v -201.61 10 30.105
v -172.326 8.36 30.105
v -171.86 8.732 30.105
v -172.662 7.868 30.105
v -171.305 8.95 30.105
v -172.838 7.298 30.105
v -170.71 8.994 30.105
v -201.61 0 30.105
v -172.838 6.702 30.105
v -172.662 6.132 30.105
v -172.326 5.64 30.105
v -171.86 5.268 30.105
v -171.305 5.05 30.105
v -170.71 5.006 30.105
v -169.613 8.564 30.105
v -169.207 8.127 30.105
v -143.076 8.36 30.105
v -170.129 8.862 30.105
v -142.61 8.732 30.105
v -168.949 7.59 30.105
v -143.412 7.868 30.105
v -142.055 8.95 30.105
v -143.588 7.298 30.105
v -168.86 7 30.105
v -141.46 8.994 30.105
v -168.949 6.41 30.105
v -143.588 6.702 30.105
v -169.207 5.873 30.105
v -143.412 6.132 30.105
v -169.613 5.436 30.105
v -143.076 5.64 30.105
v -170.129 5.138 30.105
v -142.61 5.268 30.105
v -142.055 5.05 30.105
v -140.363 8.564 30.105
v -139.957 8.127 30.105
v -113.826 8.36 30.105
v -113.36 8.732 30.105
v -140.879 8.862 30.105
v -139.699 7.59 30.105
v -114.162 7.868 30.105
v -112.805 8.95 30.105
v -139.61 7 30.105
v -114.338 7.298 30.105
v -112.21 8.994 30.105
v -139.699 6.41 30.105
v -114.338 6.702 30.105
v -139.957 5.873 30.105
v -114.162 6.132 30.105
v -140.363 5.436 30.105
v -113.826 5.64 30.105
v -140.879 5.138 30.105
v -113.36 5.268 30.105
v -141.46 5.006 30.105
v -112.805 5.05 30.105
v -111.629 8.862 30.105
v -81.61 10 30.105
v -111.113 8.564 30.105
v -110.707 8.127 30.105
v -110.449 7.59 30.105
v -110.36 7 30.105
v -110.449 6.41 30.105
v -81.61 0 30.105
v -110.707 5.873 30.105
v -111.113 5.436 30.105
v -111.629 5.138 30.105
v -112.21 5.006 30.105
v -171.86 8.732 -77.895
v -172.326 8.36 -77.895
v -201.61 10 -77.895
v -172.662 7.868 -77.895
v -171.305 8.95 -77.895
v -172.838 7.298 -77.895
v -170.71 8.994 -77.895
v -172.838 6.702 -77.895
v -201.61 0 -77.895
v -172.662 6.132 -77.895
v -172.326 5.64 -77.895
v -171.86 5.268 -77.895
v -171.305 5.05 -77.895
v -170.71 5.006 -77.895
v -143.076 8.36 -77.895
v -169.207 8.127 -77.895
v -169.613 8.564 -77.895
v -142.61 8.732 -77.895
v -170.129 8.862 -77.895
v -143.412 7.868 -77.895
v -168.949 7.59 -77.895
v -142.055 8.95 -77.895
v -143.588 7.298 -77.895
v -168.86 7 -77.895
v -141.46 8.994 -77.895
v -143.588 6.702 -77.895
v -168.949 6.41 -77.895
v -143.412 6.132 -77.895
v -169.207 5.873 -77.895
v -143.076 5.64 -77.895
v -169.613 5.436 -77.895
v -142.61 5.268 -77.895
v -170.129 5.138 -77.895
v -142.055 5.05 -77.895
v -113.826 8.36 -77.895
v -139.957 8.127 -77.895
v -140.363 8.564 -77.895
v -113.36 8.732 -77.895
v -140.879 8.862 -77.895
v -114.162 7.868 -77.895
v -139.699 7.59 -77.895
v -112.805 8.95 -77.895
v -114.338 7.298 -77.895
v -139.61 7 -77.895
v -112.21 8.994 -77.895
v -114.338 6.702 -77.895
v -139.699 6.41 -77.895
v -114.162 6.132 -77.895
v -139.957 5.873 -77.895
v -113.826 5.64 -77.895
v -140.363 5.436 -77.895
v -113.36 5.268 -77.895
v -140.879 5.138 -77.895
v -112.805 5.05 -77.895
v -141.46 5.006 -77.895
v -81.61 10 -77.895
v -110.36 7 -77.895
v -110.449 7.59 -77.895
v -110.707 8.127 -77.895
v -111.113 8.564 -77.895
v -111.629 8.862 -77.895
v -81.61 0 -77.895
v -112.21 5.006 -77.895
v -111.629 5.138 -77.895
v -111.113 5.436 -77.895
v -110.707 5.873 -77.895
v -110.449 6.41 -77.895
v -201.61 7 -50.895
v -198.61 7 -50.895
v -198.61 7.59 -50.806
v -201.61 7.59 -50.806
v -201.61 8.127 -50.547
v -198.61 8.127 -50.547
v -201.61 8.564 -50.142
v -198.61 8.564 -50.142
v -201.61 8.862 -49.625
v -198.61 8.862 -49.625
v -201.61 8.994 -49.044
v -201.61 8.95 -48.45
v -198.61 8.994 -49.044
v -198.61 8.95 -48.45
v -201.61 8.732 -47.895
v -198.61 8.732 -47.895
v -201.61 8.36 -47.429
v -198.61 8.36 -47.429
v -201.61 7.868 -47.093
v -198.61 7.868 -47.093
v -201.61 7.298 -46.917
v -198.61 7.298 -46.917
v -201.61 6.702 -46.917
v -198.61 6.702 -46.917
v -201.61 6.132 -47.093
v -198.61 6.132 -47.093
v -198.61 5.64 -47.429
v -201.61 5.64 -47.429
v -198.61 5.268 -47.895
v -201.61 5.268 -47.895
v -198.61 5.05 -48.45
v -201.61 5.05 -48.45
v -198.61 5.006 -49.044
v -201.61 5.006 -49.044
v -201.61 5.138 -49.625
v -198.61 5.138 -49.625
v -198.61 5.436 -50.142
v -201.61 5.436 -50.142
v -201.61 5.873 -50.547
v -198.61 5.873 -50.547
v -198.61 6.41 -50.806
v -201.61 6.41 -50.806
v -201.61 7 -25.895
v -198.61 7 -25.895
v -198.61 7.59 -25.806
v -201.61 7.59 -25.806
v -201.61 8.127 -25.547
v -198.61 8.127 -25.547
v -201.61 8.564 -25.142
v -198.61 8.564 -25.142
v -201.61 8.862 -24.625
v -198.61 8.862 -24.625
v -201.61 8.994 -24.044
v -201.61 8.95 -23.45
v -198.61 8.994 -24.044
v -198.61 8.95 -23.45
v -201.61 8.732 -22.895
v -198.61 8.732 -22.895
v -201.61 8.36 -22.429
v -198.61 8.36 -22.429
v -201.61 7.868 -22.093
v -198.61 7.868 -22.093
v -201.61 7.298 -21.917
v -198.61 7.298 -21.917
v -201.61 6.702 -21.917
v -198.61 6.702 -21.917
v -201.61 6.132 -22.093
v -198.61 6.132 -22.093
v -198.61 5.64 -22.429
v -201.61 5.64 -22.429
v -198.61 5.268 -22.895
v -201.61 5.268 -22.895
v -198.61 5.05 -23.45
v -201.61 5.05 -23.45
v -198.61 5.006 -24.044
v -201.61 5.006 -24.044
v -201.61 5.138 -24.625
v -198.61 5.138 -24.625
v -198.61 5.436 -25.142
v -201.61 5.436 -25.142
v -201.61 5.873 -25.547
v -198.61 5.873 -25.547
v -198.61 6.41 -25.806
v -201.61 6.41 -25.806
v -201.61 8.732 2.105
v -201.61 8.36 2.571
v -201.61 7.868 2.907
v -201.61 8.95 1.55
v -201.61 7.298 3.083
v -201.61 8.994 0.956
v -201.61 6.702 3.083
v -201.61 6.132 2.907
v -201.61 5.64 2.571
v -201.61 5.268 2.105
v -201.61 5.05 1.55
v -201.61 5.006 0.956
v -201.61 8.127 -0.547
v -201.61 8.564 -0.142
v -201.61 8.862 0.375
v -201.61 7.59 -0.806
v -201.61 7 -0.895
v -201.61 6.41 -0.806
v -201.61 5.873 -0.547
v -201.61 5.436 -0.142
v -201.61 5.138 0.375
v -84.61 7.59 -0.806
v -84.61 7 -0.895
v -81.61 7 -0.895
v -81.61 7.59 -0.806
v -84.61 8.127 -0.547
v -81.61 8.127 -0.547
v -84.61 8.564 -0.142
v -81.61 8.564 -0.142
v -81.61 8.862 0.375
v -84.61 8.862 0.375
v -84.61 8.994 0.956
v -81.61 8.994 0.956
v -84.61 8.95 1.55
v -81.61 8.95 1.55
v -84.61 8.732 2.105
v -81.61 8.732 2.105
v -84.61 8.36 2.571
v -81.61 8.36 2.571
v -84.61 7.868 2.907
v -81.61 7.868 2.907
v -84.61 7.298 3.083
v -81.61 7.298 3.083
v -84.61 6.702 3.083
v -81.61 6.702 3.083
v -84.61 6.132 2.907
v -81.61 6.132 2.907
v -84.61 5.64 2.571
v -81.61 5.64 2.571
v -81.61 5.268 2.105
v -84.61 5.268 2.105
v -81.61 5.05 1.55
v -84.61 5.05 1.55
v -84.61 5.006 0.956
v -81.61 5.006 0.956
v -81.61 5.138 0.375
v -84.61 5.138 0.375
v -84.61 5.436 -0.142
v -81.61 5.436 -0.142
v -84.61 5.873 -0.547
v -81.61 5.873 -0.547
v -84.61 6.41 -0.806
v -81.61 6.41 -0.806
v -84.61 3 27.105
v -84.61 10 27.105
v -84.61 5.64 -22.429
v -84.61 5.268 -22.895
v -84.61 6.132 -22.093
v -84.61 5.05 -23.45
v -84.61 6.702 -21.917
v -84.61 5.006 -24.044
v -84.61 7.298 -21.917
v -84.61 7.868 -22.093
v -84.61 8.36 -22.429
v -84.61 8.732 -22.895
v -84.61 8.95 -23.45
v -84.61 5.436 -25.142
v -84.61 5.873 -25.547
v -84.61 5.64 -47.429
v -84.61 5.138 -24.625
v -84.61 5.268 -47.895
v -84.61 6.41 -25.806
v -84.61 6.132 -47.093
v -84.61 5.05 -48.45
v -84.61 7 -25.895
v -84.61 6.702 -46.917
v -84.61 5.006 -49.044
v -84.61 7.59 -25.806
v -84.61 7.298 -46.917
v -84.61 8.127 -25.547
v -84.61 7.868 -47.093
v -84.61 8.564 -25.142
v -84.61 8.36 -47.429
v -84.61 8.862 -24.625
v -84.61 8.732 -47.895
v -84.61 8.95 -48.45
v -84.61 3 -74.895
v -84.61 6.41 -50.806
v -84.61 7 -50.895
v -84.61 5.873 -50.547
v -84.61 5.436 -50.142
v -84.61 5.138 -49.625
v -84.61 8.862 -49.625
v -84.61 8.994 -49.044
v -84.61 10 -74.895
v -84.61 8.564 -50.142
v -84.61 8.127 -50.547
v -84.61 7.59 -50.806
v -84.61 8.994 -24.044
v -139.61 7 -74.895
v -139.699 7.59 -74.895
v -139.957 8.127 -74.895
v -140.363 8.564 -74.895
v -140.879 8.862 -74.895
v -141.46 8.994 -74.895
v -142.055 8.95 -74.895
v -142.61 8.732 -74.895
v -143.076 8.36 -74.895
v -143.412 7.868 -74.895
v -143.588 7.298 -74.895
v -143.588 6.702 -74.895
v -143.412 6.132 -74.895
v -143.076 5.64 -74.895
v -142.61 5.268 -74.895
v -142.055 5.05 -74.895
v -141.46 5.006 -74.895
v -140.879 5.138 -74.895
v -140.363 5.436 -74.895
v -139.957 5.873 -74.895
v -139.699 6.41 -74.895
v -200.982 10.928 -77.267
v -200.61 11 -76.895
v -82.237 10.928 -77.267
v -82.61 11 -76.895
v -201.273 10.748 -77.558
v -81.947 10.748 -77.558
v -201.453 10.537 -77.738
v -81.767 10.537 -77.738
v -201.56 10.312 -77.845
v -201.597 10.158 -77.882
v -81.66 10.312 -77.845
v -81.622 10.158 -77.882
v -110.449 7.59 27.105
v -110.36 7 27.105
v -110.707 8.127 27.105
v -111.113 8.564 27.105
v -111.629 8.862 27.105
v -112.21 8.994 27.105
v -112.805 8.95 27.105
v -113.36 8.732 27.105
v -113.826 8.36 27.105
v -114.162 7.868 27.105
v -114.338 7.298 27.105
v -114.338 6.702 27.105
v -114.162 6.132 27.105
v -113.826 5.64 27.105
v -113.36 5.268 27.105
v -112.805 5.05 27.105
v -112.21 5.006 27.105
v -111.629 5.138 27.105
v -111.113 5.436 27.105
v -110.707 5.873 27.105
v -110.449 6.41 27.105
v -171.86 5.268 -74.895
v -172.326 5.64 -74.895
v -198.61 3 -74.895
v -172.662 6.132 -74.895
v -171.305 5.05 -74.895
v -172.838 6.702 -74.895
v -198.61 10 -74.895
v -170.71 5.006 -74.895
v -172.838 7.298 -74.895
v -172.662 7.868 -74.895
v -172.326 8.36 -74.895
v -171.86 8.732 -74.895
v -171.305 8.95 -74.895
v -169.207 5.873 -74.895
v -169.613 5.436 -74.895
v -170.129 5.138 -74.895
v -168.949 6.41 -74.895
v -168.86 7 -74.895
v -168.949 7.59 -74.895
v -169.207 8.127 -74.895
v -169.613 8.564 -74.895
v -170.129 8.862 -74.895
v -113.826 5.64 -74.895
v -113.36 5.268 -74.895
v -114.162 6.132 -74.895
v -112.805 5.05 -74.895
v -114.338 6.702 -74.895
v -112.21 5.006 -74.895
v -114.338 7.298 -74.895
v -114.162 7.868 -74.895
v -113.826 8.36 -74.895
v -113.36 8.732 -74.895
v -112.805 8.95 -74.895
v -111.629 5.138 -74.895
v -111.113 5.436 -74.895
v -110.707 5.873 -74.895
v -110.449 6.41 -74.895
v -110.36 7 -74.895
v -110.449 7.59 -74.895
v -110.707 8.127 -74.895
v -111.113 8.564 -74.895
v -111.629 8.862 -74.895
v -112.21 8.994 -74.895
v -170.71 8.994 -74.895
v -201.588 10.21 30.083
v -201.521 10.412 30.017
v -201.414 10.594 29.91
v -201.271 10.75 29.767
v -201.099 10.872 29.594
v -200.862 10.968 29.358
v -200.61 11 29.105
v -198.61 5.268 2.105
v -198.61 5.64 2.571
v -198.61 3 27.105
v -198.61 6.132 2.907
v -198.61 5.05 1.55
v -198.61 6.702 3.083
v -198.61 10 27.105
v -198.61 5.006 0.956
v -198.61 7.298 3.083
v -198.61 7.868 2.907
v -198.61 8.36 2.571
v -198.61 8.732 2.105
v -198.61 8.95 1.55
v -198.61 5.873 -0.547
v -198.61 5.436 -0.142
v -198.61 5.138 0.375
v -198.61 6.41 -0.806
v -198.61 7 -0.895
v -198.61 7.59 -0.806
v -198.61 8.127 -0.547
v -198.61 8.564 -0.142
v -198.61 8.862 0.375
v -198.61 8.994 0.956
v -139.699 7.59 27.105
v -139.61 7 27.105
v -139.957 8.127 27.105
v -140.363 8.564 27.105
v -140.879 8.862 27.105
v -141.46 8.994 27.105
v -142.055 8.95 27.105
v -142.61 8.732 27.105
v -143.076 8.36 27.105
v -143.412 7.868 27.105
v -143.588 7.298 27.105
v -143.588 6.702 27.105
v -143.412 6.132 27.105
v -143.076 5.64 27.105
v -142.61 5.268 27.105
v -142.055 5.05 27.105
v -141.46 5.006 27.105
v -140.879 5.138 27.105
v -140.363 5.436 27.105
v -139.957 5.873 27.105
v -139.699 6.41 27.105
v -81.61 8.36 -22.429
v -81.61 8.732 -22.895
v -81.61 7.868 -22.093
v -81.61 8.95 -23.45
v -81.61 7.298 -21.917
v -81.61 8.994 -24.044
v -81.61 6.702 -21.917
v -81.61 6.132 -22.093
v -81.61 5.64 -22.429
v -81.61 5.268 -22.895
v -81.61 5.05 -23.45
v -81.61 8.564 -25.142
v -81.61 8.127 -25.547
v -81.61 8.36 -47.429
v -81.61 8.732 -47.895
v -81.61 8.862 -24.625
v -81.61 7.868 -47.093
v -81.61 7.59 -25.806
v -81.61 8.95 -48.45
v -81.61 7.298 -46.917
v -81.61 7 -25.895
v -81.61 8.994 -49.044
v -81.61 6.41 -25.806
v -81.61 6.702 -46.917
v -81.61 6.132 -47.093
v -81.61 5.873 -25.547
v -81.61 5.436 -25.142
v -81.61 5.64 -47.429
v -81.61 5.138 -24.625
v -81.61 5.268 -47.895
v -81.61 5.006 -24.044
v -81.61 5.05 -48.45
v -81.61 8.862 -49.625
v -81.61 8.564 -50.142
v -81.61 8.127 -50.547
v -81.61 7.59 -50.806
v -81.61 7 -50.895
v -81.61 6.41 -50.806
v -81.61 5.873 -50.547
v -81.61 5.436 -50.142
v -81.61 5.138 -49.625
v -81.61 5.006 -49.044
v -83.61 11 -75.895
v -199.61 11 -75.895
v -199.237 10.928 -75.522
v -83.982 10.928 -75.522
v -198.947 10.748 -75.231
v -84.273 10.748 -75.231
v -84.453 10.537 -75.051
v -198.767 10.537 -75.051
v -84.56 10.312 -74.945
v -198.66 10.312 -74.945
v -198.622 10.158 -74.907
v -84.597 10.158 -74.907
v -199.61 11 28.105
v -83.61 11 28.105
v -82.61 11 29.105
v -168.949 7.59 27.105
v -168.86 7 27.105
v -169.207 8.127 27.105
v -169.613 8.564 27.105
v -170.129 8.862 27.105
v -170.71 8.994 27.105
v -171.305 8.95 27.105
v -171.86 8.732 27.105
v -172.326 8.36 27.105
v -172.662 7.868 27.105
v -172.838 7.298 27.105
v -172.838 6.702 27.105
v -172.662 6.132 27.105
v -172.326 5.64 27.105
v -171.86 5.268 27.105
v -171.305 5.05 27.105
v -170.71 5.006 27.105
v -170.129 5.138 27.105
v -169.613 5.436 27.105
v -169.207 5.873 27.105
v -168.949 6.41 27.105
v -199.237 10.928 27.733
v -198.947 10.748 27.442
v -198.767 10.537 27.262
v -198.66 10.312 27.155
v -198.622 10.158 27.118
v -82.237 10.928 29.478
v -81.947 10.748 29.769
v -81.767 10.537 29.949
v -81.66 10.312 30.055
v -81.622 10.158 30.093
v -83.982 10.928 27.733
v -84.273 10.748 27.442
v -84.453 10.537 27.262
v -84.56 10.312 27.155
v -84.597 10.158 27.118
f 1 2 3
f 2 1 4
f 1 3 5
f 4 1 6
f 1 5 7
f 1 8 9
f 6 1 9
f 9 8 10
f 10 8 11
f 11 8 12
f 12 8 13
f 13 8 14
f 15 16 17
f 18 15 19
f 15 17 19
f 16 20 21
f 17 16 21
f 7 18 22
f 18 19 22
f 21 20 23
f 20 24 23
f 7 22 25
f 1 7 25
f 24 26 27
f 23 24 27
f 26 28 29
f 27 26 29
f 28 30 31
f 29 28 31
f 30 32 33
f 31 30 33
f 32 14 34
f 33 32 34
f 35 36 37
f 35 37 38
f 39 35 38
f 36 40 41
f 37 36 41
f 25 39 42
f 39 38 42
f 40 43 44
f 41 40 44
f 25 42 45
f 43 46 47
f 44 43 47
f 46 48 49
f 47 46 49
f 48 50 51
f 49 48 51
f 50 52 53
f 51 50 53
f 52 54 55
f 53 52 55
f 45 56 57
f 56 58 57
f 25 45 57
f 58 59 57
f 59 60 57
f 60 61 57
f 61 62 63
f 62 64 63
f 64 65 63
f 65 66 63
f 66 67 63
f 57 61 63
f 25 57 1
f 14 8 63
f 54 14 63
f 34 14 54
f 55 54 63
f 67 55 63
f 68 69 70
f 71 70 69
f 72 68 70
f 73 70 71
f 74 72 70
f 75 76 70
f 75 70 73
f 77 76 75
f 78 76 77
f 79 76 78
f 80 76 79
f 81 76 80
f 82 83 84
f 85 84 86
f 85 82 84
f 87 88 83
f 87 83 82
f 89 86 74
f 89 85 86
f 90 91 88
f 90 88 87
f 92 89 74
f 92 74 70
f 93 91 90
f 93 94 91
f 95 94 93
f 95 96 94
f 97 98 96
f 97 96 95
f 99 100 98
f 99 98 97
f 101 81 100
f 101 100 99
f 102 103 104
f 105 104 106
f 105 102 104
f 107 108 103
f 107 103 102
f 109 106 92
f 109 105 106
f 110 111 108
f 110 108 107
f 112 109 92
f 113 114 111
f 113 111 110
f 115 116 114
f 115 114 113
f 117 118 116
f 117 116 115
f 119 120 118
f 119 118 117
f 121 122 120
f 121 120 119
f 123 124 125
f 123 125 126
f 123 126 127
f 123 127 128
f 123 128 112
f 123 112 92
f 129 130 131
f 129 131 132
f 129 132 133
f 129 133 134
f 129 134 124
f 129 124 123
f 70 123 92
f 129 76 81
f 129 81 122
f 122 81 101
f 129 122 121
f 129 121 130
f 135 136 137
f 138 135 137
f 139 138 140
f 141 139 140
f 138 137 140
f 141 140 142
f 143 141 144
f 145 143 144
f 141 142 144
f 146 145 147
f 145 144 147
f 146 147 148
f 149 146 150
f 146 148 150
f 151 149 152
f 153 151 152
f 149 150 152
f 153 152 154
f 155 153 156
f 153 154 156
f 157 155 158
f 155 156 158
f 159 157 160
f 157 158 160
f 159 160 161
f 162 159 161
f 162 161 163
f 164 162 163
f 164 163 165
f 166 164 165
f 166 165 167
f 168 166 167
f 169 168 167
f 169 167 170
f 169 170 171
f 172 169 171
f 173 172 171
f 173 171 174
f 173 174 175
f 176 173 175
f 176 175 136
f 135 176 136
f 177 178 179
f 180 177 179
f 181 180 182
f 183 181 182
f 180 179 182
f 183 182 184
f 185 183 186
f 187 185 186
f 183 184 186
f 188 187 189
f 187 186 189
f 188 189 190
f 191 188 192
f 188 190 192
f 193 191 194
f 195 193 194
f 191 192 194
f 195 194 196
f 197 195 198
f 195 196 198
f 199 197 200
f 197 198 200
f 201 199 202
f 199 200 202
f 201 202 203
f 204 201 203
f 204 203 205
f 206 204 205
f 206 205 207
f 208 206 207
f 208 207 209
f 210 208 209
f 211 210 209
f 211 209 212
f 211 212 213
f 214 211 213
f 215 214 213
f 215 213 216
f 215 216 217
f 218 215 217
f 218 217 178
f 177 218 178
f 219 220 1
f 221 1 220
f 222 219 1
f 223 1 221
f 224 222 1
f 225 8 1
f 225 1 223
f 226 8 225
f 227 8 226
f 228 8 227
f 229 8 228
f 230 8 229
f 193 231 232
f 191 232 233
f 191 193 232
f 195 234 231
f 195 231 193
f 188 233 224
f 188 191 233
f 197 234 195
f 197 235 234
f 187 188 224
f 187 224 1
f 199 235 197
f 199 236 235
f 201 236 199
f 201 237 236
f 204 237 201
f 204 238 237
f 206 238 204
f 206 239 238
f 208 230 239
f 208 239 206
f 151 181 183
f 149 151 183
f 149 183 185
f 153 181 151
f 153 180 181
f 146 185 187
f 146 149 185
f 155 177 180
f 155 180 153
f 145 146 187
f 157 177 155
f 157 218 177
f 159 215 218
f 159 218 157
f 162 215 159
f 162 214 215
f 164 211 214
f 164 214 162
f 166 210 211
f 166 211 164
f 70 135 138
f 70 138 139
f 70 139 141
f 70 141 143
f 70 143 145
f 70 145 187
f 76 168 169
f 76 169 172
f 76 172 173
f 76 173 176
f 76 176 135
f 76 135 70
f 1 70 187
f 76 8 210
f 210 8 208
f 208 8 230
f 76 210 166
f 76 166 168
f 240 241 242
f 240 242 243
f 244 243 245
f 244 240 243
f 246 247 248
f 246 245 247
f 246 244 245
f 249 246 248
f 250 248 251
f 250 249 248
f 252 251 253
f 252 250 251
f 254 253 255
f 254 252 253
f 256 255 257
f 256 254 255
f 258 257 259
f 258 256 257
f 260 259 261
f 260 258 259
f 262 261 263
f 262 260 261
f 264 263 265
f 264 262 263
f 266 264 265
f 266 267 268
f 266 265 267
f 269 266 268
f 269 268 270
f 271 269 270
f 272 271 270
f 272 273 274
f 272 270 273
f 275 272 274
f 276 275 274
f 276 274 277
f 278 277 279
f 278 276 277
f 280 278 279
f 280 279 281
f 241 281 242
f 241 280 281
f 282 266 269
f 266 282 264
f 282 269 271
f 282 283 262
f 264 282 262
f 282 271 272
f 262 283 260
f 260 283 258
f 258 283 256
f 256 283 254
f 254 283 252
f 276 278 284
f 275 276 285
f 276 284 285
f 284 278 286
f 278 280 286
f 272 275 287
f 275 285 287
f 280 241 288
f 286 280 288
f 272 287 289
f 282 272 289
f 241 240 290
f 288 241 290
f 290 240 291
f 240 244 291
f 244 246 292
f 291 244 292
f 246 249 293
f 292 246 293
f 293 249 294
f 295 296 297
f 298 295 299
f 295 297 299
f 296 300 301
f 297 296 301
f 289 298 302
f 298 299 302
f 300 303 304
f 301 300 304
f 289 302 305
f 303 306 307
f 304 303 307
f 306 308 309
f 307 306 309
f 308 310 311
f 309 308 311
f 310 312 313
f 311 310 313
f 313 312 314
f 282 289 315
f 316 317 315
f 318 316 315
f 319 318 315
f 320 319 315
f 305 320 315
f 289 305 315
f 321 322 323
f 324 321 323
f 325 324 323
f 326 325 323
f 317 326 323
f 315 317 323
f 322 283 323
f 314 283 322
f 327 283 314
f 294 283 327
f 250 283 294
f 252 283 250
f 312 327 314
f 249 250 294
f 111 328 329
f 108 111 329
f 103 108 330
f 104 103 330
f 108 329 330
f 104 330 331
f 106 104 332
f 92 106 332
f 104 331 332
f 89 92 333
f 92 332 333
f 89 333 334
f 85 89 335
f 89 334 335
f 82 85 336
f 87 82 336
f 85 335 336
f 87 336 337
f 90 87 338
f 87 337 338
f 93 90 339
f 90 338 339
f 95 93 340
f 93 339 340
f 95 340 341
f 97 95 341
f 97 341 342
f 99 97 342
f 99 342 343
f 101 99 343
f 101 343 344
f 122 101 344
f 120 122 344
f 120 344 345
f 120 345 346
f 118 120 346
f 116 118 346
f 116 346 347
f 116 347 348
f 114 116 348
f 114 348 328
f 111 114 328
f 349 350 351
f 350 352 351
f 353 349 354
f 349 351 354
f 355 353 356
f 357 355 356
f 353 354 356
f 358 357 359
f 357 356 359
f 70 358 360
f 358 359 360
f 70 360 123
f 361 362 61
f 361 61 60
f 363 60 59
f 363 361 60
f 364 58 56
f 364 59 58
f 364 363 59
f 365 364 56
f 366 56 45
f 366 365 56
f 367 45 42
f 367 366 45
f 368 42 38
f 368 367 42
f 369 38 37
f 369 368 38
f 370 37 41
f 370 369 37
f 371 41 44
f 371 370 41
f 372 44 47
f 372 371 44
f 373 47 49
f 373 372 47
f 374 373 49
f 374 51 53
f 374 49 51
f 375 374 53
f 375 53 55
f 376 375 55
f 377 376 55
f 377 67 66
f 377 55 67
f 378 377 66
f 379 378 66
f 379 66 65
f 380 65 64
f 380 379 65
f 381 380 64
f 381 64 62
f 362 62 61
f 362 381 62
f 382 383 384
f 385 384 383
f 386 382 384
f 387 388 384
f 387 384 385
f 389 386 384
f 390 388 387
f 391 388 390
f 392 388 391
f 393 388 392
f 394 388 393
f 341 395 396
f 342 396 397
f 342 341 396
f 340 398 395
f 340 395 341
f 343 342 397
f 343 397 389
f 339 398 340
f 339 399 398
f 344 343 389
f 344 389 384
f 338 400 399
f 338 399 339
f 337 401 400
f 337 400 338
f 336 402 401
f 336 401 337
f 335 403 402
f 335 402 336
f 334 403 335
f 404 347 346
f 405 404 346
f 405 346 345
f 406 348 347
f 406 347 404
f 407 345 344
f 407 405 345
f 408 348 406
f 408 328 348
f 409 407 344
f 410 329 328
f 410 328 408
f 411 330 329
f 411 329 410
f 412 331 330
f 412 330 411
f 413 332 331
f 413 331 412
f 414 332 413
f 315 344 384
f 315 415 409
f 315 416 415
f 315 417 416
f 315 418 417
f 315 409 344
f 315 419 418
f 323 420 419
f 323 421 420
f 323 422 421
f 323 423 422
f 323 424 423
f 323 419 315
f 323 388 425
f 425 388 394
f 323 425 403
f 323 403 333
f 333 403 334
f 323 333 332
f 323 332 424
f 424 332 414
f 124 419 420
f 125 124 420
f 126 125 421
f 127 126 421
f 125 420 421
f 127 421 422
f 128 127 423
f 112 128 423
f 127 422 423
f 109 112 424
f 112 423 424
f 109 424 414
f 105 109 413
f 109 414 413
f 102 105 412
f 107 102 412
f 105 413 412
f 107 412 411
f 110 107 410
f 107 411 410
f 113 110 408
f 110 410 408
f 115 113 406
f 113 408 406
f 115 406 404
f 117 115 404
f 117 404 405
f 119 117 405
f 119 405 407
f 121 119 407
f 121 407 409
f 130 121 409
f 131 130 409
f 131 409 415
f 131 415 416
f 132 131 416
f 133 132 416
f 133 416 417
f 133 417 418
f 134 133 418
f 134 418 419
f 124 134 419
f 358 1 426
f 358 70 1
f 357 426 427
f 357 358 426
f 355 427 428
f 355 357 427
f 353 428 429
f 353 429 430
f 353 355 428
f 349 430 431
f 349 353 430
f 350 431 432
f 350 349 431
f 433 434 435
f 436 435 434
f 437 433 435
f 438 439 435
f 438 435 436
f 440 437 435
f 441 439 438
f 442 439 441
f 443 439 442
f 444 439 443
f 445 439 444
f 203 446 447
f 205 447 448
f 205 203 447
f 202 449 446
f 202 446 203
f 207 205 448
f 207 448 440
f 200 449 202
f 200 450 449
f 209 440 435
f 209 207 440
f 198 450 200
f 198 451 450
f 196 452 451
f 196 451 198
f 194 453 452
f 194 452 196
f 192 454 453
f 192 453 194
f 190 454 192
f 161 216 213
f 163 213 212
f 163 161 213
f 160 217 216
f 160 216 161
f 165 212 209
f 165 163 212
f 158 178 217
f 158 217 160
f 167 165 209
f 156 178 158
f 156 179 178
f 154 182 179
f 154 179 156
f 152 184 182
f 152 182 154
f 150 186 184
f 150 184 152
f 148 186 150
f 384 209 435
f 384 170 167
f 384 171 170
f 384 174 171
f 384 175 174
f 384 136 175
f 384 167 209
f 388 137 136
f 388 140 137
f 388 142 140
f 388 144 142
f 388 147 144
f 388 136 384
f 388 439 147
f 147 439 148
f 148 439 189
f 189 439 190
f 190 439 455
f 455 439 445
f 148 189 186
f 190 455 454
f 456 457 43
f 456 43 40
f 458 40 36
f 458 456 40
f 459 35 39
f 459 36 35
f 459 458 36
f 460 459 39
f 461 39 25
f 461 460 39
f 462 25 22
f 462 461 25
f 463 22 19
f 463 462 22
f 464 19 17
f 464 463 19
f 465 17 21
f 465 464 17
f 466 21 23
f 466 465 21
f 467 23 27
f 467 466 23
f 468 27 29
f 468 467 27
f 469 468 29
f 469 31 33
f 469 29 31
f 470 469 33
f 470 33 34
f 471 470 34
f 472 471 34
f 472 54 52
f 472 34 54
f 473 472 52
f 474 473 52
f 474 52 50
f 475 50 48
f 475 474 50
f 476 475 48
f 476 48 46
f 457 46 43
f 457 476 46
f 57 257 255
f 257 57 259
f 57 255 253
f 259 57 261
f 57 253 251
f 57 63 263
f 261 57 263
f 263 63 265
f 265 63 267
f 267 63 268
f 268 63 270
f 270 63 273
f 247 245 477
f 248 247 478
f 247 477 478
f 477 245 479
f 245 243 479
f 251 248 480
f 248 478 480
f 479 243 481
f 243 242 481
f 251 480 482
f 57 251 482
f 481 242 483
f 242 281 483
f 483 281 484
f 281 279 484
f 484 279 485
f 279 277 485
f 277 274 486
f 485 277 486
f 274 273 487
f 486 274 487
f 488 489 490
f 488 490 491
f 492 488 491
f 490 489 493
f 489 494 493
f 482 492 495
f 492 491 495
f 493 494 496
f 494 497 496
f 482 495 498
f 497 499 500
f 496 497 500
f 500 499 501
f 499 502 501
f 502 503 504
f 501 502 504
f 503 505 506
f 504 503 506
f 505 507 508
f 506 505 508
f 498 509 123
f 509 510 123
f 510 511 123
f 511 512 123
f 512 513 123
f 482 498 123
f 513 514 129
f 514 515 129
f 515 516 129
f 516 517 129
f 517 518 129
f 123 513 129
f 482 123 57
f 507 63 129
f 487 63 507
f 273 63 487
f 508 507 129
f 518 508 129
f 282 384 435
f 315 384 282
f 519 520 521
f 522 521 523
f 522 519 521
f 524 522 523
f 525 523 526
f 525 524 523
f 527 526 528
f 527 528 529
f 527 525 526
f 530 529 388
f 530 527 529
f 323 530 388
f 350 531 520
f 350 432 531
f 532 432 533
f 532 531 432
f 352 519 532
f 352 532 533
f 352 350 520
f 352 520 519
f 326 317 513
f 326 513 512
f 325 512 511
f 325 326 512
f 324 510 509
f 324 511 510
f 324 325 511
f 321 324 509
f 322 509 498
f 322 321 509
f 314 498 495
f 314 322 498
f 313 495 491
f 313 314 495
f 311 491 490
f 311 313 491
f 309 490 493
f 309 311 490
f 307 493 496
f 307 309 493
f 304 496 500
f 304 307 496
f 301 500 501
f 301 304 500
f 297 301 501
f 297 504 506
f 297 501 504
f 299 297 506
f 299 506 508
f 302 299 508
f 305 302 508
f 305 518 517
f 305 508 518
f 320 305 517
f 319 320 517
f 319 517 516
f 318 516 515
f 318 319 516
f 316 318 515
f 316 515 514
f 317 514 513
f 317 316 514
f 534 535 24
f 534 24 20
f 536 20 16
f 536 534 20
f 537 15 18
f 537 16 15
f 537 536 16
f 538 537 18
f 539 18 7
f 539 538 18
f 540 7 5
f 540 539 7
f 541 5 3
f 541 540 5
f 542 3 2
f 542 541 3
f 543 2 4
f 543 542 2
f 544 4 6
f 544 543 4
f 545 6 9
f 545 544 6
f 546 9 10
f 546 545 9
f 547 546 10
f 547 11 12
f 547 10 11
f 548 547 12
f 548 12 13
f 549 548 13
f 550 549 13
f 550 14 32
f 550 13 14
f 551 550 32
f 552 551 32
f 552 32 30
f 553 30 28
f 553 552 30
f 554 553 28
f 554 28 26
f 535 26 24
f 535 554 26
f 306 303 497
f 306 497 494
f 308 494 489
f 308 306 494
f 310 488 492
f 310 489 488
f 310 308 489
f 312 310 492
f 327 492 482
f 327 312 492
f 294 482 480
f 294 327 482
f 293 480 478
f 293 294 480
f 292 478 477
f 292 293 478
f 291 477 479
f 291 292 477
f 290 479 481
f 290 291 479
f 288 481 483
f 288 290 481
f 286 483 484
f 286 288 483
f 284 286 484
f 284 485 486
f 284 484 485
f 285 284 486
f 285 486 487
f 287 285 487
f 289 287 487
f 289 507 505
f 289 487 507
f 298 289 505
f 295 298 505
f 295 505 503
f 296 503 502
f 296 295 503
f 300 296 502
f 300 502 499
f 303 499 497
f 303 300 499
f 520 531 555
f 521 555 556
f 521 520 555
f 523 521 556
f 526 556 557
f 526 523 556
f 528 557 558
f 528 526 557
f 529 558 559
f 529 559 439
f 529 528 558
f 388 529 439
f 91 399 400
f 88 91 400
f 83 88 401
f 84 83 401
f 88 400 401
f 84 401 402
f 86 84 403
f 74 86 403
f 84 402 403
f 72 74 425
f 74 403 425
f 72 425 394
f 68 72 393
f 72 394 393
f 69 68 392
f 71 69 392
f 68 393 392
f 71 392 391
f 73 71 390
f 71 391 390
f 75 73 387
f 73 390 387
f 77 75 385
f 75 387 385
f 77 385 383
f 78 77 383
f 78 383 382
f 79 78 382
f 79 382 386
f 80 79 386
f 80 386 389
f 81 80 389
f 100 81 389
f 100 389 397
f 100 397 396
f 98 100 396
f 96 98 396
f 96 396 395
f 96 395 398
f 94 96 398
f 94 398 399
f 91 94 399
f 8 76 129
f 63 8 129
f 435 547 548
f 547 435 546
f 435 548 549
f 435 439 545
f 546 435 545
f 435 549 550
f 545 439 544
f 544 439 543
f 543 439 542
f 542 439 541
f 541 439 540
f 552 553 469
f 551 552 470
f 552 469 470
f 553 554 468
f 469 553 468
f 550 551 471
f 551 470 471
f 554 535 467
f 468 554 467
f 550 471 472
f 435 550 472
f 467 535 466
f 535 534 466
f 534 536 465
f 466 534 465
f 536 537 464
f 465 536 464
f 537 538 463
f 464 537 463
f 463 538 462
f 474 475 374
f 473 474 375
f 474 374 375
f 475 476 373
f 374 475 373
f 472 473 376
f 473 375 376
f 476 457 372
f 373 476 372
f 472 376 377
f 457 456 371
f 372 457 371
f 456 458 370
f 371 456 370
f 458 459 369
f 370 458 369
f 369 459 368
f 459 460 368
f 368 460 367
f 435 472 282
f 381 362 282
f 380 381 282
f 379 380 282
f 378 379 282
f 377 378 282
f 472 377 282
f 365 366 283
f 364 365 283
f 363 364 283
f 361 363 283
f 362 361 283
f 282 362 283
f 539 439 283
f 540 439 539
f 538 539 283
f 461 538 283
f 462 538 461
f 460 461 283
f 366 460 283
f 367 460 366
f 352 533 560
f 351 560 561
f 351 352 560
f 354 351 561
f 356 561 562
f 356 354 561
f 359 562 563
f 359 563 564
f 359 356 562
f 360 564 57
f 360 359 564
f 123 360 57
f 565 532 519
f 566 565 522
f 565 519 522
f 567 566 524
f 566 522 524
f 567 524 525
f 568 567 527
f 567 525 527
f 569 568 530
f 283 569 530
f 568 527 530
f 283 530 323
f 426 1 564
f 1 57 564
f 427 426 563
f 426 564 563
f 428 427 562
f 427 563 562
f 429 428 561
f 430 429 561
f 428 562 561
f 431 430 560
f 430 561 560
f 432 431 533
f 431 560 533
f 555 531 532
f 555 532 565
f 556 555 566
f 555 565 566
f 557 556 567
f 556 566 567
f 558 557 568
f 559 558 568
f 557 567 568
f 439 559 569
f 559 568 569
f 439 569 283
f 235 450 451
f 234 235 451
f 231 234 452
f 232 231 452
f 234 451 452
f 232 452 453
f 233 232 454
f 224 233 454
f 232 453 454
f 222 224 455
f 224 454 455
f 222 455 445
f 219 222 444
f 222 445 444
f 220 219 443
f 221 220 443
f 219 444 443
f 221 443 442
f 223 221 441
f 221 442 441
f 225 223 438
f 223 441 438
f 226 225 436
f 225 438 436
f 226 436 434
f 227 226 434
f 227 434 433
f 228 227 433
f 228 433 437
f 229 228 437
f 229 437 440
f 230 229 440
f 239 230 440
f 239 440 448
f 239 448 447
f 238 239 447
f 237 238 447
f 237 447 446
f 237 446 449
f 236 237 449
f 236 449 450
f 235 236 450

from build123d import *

# Parameters (mm, degrees)
SKETCH1_W               = 120
SKETCH1_H               = 108
BOSS_EXTRUDE1_DEPTH     = 11
SKETCH4_W               = 114
SKETCH4_H               = 102
CUT_EXTRUDE1_DEPTH      = 8
SKETCH6_R               = 1.999999993
SKETCH6_R_2             = 2
CUT_EXTRUDE6_DEPTH      = 118
CUT_EXTRUDE6_DEPTH_BACK = 4
SKETCH5_R               = 2
CUT_EXTRUDE5_DEPTH      = 106
CUT_EXTRUDE5_DEPTH_BACK = 4
FILLET2_R               = 1


with BuildPart() as part:
    # Sketch1 → Boss-Extrude1 (new body)
    with BuildSketch(Plane(origin=(0, 0, 0), x_dir=(1, 0, 0), z_dir=(0, 1, 0))):
        with Locations((-141.609907121, 23.894736842)):
            Rectangle(SKETCH1_W, SKETCH1_H)
    extrude(amount=BOSS_EXTRUDE1_DEPTH)

    # Sketch4 → Cut-Extrude1 (cut)
    with BuildSketch(Plane(origin=(0, 11, 0), x_dir=(1, 0, 0), z_dir=(0, 1, 0))):
        with Locations((-141.609907121, 23.894736842)):
            Rectangle(SKETCH4_W, SKETCH4_H)
    extrude(amount=-CUT_EXTRUDE1_DEPTH, mode=Mode.SUBTRACT)

    # Sketch6 → Cut-Extrude6 (cut, two sides)
    with BuildSketch(Plane(origin=(-198.609907121, 0, 0), x_dir=(0, 0, -1), z_dir=(1, 0, 0))) as cut_extrude6_sk:
        with Locations((-1.105263158, 6.999999977)):
            Circle(SKETCH6_R)
        with Locations((23.894736842, 6.999999977)):
            Circle(SKETCH6_R_2)
        with Locations((48.894736842, 7)):
            Circle(SKETCH6_R_2)
    extrude(amount=CUT_EXTRUDE6_DEPTH, mode=Mode.SUBTRACT)
    extrude(cut_extrude6_sk.sketch, amount=-CUT_EXTRUDE6_DEPTH_BACK, mode=Mode.SUBTRACT)

    # Sketch5 → Cut-Extrude5 (cut, two sides)
    with BuildSketch(Plane.XY.offset(-74.894736842)) as cut_extrude5_sk:
        with Locations((-170.859907121, 7)):
            Circle(SKETCH5_R)
        with Locations((-141.609907121, 7)):
            Circle(SKETCH5_R)
        with Locations((-112.359907121, 7)):
            Circle(SKETCH5_R)
    extrude(amount=CUT_EXTRUDE5_DEPTH, mode=Mode.SUBTRACT)
    extrude(cut_extrude5_sk.sketch, amount=-CUT_EXTRUDE5_DEPTH_BACK, mode=Mode.SUBTRACT)

    # Fillet2
    fillet2_edges = [part.edges().sort_by_distance(p)[0] for p in [
        (-81.609907121, 11, -23.894736842),
        (-141.609907121, 11, -77.894736842),
        (-198.609907121, 11, -23.894736842),
        (-141.609907121, 11, 27.105263158),
        (-84.609907121, 11, -23.894736842),
        (-141.609907121, 11, -74.894736842),
        (-201.609907121, 11, -23.894736842),
        (-141.609907121, 11, 30.105263158),
    ]]
    fillet(fillet2_edges, radius=FILLET2_R)


solid = part.part
